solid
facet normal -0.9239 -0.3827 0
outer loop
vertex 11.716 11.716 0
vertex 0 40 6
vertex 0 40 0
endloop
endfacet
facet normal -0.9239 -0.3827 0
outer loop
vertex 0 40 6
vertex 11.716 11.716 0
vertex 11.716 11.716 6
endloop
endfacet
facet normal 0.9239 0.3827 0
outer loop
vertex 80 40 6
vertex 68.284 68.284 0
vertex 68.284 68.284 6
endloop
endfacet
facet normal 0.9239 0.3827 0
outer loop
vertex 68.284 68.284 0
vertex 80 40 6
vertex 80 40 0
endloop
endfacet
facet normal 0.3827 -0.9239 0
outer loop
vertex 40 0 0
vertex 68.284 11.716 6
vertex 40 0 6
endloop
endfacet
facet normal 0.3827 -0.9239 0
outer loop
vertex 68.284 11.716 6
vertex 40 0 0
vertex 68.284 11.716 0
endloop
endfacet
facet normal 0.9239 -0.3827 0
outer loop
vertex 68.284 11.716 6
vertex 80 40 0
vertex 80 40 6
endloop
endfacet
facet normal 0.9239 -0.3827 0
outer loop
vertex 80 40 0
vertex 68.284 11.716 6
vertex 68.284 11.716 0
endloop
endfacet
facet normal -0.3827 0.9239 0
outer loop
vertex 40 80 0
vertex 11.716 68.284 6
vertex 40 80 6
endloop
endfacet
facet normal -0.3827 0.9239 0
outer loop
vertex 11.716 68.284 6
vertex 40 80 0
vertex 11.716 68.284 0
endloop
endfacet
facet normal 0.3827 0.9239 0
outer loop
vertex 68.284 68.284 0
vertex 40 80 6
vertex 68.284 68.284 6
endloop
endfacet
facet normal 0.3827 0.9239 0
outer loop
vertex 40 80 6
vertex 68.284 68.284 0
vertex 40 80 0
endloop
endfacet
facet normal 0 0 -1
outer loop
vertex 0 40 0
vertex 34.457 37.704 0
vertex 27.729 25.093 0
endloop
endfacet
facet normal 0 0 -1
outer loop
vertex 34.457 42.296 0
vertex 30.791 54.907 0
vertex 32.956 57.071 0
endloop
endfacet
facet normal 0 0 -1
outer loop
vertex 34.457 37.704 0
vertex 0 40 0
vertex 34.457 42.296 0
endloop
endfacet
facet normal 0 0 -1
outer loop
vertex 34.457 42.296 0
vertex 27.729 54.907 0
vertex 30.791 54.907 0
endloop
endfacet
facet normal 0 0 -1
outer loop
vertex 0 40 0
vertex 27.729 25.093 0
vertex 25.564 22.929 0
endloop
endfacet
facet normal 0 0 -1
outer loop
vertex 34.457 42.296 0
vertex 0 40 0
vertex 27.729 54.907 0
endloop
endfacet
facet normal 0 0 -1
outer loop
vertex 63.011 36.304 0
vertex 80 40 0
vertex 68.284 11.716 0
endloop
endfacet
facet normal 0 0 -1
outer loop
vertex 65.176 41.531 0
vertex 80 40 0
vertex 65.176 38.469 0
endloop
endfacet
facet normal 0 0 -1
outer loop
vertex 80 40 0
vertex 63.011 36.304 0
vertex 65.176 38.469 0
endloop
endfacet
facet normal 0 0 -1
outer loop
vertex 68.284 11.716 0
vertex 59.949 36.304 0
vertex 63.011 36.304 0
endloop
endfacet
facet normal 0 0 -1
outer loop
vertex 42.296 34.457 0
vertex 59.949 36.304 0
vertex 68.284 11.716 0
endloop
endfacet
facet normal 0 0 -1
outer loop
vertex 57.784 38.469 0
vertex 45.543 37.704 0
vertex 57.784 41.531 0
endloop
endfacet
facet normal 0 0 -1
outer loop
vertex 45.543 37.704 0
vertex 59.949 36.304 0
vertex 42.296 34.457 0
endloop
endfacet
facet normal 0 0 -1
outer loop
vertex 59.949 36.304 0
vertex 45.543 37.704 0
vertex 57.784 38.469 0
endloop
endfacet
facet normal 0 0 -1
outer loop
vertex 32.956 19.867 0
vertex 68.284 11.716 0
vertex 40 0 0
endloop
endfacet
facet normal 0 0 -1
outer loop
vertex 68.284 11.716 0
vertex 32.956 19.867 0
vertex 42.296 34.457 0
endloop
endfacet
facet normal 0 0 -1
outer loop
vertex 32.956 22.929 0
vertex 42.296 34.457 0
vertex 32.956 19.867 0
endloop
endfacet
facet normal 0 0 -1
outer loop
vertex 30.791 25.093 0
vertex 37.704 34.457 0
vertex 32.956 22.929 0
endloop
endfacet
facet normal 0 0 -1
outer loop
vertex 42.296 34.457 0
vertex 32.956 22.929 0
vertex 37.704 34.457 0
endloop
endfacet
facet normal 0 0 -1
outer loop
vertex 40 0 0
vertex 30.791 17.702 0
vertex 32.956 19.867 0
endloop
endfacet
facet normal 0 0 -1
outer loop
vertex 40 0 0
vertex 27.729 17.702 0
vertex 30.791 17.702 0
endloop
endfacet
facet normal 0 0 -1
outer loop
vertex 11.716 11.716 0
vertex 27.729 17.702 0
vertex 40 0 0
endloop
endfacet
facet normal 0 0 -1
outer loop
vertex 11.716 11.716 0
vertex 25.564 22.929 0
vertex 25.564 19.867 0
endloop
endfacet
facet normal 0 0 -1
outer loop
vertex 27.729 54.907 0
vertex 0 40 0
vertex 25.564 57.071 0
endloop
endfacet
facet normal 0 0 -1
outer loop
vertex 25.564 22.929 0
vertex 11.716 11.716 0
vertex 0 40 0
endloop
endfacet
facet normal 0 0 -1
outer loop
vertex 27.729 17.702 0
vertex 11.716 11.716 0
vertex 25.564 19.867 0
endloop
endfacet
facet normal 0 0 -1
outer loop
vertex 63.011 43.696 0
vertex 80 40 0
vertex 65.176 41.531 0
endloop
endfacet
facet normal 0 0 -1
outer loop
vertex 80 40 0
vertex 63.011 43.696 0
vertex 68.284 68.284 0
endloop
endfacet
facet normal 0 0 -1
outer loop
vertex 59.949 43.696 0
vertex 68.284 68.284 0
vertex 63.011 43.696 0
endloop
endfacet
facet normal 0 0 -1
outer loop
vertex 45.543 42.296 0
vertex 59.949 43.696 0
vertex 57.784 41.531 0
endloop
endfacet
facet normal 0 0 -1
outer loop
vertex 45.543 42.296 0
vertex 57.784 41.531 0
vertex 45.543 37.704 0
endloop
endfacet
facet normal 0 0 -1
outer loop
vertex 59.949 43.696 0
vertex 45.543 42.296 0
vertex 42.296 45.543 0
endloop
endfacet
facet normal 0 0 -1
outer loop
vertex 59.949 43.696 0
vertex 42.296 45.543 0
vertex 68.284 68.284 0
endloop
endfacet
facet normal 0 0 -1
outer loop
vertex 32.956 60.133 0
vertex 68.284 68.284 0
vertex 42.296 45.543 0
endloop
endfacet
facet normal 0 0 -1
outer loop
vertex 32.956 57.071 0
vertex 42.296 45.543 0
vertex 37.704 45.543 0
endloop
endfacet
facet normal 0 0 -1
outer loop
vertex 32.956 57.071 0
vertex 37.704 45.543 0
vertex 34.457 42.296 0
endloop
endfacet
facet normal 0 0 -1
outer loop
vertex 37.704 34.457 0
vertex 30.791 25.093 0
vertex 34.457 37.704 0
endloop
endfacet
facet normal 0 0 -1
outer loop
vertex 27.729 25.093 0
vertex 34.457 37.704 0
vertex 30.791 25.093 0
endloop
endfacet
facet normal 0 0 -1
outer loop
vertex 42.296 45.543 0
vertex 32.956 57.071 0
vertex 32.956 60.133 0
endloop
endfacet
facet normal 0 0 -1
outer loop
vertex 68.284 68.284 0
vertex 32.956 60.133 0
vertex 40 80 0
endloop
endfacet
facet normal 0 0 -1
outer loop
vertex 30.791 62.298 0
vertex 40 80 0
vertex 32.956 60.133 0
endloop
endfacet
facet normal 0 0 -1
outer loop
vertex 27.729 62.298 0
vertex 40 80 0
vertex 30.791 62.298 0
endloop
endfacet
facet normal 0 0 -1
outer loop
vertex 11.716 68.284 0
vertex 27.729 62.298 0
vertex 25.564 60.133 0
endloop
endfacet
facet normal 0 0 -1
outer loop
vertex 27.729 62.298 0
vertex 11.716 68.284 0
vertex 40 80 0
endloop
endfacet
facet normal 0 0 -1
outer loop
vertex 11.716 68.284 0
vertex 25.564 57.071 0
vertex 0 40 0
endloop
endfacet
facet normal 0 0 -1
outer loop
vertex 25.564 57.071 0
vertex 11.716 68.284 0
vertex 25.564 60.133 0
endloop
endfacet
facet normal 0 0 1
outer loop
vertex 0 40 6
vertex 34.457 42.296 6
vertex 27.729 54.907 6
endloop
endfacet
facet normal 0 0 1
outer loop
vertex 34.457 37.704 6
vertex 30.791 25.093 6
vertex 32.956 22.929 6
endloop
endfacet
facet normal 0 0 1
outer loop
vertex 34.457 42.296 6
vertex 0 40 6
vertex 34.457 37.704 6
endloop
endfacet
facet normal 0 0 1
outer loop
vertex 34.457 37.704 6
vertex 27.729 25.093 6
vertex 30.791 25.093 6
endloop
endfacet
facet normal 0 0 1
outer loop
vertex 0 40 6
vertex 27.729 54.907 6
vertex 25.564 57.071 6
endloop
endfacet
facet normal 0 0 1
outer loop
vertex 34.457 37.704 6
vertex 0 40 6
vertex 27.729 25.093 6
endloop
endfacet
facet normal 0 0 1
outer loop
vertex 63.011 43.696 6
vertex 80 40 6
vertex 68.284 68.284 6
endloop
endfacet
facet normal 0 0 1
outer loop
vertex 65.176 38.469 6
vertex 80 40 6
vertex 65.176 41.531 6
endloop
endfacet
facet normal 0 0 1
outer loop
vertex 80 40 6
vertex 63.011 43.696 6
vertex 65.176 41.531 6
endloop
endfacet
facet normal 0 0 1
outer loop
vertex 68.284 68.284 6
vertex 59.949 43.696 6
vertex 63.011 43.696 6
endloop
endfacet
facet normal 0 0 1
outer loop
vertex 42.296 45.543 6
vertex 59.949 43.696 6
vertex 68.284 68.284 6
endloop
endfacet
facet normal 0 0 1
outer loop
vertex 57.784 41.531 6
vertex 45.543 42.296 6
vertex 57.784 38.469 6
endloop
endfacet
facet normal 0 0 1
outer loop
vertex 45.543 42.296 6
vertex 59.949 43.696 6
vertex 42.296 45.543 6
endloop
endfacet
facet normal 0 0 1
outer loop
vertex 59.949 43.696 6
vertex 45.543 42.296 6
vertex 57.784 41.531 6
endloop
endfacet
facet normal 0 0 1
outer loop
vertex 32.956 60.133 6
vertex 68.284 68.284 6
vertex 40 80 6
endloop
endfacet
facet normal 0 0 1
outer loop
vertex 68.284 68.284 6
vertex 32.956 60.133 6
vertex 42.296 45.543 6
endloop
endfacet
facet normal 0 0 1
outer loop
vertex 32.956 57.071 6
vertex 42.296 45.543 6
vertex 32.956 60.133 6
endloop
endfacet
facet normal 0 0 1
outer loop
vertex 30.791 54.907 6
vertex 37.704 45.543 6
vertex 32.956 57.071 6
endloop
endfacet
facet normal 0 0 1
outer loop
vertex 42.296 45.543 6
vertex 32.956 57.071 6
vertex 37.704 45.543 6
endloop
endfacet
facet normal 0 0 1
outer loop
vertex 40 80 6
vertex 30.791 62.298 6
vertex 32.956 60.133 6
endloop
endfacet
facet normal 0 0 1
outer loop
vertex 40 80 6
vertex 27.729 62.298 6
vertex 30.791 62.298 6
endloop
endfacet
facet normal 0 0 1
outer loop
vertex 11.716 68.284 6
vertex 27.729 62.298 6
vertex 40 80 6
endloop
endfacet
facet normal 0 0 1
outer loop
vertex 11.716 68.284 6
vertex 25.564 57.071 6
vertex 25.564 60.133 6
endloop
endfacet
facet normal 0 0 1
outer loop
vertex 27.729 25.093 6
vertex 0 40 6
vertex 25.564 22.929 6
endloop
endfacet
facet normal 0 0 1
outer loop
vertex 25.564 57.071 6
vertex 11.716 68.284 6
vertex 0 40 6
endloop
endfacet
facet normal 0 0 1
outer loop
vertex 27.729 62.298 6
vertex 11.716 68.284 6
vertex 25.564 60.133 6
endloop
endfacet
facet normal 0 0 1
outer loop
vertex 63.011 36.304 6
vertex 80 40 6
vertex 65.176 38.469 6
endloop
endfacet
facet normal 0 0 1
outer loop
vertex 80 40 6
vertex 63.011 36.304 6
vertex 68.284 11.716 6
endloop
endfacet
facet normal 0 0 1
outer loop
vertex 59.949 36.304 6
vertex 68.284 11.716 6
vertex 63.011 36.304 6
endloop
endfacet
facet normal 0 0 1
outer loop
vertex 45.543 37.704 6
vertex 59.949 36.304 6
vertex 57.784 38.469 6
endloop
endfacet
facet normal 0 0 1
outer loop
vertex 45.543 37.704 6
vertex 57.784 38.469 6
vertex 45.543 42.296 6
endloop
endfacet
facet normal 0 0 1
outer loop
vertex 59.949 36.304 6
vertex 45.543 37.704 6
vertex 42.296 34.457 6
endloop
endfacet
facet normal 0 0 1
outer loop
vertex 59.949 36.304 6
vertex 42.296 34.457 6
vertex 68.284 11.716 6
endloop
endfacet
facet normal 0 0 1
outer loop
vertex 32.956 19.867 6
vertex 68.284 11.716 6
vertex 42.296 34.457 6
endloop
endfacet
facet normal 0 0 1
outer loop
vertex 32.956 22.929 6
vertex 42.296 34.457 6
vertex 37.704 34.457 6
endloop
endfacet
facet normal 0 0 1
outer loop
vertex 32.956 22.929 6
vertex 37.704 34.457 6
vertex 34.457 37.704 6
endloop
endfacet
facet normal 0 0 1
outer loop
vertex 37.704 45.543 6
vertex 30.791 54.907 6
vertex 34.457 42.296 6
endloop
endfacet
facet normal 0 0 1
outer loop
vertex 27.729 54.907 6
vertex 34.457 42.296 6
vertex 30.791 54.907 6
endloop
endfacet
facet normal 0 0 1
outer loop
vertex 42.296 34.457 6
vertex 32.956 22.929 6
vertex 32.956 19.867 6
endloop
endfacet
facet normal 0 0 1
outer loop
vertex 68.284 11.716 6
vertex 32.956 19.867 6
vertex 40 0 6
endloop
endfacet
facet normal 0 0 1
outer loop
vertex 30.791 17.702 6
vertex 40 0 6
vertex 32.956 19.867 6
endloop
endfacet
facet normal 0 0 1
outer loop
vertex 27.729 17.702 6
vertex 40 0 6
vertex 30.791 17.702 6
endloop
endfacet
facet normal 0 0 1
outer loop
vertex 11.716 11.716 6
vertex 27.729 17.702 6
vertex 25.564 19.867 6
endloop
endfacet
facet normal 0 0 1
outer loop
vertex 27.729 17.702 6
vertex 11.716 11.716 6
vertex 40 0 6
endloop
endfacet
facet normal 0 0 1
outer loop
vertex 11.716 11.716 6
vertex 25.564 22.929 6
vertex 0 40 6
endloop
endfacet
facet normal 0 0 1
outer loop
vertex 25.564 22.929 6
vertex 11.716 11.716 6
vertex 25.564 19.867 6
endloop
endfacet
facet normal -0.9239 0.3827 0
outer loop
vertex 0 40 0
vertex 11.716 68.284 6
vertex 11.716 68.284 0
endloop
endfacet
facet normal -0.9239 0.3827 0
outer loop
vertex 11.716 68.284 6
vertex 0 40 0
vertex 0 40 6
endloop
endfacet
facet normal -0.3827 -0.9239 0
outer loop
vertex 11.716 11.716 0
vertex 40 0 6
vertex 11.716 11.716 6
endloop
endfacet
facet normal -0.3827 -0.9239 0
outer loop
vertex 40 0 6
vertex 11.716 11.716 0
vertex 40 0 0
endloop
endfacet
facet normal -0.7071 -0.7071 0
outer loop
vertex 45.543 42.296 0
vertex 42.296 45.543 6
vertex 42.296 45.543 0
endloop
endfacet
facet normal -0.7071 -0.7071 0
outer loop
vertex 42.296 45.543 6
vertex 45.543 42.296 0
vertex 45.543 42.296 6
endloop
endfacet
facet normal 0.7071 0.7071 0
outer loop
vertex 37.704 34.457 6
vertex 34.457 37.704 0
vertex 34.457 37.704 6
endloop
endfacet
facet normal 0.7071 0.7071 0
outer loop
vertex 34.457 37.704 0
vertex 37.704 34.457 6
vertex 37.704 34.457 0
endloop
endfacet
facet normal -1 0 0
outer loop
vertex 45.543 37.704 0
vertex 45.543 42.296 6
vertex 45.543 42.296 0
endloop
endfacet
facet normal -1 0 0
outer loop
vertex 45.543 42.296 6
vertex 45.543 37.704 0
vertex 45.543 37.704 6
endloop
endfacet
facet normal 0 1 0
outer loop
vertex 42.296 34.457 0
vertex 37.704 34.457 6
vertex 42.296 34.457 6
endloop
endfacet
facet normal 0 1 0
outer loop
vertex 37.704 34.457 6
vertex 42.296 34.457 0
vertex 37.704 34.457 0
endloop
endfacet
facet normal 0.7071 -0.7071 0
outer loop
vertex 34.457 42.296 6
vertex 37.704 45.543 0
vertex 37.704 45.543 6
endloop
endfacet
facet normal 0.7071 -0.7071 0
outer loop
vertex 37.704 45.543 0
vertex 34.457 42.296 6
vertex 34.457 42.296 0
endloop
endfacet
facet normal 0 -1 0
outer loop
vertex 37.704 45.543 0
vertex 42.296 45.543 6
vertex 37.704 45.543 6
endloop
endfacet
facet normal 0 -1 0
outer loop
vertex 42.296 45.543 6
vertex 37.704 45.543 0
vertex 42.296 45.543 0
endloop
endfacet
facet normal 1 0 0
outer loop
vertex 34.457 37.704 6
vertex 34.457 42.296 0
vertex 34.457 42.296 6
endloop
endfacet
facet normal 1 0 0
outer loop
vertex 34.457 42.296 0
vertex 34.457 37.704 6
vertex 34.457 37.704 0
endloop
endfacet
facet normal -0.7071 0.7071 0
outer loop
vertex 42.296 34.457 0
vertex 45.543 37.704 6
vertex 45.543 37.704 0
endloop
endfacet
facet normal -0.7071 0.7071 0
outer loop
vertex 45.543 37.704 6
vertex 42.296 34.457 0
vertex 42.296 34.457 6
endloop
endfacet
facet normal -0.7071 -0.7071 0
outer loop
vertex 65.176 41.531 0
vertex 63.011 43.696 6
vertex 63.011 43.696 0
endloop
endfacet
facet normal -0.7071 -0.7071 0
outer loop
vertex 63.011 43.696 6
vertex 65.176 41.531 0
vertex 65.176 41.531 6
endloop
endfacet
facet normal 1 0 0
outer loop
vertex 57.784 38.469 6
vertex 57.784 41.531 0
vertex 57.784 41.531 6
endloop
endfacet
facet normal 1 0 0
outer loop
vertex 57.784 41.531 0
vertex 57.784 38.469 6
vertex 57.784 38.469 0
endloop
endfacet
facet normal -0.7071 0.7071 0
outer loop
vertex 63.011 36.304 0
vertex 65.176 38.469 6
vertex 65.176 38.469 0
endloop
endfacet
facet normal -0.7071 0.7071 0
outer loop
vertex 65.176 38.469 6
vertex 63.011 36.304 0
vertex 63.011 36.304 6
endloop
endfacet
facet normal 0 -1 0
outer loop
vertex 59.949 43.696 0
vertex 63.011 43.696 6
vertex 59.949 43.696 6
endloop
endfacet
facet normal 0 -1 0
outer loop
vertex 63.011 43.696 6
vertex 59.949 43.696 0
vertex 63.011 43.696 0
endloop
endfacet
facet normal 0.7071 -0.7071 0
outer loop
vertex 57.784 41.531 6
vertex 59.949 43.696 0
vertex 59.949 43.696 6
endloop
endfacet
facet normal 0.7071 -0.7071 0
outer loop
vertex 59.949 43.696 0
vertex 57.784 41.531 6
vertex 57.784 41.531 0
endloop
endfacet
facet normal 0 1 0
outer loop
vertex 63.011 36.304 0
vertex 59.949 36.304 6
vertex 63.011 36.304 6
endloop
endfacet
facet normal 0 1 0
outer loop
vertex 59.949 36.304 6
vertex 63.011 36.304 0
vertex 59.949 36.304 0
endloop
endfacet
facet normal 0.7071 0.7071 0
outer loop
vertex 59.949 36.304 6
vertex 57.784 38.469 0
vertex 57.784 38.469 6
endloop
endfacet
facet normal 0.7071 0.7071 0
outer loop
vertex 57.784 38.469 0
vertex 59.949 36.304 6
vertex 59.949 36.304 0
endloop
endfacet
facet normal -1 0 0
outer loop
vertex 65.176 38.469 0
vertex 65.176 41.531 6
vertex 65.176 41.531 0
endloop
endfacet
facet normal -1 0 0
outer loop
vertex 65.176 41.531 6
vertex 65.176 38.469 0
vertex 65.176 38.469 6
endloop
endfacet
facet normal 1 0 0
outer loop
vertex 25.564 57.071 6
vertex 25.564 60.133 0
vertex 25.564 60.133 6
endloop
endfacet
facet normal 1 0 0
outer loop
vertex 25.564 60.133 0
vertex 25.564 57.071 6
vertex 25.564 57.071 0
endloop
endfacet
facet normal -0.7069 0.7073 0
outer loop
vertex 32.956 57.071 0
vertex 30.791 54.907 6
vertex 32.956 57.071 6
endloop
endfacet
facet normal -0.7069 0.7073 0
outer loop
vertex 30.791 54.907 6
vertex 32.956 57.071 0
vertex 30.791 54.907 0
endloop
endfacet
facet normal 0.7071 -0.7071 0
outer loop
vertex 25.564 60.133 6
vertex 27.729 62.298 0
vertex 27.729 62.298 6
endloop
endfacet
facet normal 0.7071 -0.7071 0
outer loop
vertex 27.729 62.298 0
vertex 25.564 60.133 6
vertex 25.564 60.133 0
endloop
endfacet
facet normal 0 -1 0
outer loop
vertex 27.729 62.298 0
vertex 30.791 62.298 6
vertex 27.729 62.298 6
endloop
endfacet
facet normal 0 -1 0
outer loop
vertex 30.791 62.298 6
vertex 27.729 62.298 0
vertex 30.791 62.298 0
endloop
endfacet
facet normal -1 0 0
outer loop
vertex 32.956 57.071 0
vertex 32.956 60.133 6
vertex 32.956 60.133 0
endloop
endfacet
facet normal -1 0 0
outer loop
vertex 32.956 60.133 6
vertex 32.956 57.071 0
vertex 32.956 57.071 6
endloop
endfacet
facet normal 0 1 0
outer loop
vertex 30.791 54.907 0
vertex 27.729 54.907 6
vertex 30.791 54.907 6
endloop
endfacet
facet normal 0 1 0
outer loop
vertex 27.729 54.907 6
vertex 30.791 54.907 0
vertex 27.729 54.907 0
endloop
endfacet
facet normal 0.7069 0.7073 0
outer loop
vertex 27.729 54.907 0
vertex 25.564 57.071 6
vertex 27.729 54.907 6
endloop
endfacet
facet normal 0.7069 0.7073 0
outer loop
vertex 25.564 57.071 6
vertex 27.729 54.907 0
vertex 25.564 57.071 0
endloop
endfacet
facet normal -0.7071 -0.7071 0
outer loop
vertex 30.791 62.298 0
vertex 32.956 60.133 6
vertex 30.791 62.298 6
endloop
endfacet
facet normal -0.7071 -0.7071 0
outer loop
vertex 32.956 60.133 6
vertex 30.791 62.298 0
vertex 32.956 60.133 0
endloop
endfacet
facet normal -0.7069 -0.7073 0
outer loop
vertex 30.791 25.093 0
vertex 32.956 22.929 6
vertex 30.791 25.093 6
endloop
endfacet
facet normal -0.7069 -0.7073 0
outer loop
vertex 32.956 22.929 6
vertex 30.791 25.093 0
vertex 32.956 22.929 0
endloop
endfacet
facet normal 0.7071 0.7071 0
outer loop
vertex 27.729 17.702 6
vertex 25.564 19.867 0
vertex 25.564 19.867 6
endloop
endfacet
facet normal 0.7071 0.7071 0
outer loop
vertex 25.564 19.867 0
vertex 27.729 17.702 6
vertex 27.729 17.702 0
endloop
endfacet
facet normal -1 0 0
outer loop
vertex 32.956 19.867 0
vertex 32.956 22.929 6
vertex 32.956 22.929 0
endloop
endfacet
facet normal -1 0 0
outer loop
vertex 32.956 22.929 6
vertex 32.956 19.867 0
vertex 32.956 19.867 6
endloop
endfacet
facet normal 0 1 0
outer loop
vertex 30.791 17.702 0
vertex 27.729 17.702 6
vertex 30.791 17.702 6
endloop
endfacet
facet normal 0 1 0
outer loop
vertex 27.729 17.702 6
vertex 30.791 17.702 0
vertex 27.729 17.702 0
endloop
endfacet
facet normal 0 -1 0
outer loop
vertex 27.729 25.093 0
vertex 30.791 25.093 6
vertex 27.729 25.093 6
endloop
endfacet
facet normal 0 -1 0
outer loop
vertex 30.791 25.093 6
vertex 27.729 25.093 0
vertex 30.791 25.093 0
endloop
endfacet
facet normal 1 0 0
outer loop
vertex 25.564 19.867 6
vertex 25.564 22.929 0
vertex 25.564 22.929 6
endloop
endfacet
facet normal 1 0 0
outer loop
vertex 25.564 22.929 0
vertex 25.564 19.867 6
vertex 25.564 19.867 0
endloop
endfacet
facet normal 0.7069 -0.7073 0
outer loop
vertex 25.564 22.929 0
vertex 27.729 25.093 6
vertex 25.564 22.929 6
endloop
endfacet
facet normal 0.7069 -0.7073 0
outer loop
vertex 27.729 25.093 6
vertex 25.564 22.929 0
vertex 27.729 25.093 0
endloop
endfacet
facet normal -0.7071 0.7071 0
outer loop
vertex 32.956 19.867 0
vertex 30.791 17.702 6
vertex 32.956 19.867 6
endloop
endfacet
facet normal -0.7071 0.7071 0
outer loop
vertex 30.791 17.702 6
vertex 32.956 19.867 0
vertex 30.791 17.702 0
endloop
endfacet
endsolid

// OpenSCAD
$fn = 32;

// ----------------------------------------------------------------------
// Polygon plate: 8-gon R40, 3 bolt windows
// ----------------------------------------------------------------------

// --- parameters (mm) ---
sides = 8;                // number of polygon sides
plate_r = 40;             // circumscribed radius of the polygon
bore_r = 6;               // centre bore radius
bolts = 3;                // number of bolt windows
ring_r = 21.48;           // bolt-circle radius
bolt_r = 4;               // bolt window radius
plate_t = 6;              // plate thickness, Z (extrusion height)

plate_d = 2 * plate_r;  // circumscribed diameter
bore_d = 2 * bore_r;  // centre bore diameter
bolt_d = 2 * bolt_r;  // bolt window diameter
ring_d = 2 * ring_r;  // bolt-circle diameter

profile = [[80, 40], [68.284, 68.284], [40, 80], [11.716, 68.284], [0, 40], [11.716, 11.716], [40, 0], [68.284, 11.716]];  // primary outline, 8 points, counter clockwise
void_1 = [[45.543, 42.296], [42.296, 45.543], [37.704, 45.543], [34.457, 42.296], [34.457, 37.704], [37.704, 34.457], [42.296, 34.457], [45.543, 37.704]];  // centre bore, 8 points
void_2 = [[65.176, 41.531], [63.011, 43.696], [59.949, 43.696], [57.784, 41.531], [57.784, 38.469], [59.949, 36.304], [63.011, 36.304], [65.176, 38.469]];  // bolt window 1, 8 points
void_3 = [[32.956, 60.133], [30.791, 62.298], [27.729, 62.298], [25.564, 60.133], [25.564, 57.071], [27.729, 54.907], [30.791, 54.907], [32.956, 57.071]];  // bolt window 2, 8 points
void_4 = [[32.956, 22.929], [30.791, 25.093], [27.729, 25.093], [25.564, 22.929], [25.564, 19.867], [27.729, 17.702], [30.791, 17.702], [32.956, 19.867]];  // bolt window 3, 8 points

// --- the one profile operation ---
difference() {
  linear_extrude(height = plate_t) polygon(points = profile);
  translate([0, 0, -1])
    linear_extrude(height = plate_t + 2) polygon(points = void_1);
  translate([0, 0, -1])
    linear_extrude(height = plate_t + 2) polygon(points = void_2);
  translate([0, 0, -1])
    linear_extrude(height = plate_t + 2) polygon(points = void_3);
  translate([0, 0, -1])
    linear_extrude(height = plate_t + 2) polygon(points = void_4);
}
